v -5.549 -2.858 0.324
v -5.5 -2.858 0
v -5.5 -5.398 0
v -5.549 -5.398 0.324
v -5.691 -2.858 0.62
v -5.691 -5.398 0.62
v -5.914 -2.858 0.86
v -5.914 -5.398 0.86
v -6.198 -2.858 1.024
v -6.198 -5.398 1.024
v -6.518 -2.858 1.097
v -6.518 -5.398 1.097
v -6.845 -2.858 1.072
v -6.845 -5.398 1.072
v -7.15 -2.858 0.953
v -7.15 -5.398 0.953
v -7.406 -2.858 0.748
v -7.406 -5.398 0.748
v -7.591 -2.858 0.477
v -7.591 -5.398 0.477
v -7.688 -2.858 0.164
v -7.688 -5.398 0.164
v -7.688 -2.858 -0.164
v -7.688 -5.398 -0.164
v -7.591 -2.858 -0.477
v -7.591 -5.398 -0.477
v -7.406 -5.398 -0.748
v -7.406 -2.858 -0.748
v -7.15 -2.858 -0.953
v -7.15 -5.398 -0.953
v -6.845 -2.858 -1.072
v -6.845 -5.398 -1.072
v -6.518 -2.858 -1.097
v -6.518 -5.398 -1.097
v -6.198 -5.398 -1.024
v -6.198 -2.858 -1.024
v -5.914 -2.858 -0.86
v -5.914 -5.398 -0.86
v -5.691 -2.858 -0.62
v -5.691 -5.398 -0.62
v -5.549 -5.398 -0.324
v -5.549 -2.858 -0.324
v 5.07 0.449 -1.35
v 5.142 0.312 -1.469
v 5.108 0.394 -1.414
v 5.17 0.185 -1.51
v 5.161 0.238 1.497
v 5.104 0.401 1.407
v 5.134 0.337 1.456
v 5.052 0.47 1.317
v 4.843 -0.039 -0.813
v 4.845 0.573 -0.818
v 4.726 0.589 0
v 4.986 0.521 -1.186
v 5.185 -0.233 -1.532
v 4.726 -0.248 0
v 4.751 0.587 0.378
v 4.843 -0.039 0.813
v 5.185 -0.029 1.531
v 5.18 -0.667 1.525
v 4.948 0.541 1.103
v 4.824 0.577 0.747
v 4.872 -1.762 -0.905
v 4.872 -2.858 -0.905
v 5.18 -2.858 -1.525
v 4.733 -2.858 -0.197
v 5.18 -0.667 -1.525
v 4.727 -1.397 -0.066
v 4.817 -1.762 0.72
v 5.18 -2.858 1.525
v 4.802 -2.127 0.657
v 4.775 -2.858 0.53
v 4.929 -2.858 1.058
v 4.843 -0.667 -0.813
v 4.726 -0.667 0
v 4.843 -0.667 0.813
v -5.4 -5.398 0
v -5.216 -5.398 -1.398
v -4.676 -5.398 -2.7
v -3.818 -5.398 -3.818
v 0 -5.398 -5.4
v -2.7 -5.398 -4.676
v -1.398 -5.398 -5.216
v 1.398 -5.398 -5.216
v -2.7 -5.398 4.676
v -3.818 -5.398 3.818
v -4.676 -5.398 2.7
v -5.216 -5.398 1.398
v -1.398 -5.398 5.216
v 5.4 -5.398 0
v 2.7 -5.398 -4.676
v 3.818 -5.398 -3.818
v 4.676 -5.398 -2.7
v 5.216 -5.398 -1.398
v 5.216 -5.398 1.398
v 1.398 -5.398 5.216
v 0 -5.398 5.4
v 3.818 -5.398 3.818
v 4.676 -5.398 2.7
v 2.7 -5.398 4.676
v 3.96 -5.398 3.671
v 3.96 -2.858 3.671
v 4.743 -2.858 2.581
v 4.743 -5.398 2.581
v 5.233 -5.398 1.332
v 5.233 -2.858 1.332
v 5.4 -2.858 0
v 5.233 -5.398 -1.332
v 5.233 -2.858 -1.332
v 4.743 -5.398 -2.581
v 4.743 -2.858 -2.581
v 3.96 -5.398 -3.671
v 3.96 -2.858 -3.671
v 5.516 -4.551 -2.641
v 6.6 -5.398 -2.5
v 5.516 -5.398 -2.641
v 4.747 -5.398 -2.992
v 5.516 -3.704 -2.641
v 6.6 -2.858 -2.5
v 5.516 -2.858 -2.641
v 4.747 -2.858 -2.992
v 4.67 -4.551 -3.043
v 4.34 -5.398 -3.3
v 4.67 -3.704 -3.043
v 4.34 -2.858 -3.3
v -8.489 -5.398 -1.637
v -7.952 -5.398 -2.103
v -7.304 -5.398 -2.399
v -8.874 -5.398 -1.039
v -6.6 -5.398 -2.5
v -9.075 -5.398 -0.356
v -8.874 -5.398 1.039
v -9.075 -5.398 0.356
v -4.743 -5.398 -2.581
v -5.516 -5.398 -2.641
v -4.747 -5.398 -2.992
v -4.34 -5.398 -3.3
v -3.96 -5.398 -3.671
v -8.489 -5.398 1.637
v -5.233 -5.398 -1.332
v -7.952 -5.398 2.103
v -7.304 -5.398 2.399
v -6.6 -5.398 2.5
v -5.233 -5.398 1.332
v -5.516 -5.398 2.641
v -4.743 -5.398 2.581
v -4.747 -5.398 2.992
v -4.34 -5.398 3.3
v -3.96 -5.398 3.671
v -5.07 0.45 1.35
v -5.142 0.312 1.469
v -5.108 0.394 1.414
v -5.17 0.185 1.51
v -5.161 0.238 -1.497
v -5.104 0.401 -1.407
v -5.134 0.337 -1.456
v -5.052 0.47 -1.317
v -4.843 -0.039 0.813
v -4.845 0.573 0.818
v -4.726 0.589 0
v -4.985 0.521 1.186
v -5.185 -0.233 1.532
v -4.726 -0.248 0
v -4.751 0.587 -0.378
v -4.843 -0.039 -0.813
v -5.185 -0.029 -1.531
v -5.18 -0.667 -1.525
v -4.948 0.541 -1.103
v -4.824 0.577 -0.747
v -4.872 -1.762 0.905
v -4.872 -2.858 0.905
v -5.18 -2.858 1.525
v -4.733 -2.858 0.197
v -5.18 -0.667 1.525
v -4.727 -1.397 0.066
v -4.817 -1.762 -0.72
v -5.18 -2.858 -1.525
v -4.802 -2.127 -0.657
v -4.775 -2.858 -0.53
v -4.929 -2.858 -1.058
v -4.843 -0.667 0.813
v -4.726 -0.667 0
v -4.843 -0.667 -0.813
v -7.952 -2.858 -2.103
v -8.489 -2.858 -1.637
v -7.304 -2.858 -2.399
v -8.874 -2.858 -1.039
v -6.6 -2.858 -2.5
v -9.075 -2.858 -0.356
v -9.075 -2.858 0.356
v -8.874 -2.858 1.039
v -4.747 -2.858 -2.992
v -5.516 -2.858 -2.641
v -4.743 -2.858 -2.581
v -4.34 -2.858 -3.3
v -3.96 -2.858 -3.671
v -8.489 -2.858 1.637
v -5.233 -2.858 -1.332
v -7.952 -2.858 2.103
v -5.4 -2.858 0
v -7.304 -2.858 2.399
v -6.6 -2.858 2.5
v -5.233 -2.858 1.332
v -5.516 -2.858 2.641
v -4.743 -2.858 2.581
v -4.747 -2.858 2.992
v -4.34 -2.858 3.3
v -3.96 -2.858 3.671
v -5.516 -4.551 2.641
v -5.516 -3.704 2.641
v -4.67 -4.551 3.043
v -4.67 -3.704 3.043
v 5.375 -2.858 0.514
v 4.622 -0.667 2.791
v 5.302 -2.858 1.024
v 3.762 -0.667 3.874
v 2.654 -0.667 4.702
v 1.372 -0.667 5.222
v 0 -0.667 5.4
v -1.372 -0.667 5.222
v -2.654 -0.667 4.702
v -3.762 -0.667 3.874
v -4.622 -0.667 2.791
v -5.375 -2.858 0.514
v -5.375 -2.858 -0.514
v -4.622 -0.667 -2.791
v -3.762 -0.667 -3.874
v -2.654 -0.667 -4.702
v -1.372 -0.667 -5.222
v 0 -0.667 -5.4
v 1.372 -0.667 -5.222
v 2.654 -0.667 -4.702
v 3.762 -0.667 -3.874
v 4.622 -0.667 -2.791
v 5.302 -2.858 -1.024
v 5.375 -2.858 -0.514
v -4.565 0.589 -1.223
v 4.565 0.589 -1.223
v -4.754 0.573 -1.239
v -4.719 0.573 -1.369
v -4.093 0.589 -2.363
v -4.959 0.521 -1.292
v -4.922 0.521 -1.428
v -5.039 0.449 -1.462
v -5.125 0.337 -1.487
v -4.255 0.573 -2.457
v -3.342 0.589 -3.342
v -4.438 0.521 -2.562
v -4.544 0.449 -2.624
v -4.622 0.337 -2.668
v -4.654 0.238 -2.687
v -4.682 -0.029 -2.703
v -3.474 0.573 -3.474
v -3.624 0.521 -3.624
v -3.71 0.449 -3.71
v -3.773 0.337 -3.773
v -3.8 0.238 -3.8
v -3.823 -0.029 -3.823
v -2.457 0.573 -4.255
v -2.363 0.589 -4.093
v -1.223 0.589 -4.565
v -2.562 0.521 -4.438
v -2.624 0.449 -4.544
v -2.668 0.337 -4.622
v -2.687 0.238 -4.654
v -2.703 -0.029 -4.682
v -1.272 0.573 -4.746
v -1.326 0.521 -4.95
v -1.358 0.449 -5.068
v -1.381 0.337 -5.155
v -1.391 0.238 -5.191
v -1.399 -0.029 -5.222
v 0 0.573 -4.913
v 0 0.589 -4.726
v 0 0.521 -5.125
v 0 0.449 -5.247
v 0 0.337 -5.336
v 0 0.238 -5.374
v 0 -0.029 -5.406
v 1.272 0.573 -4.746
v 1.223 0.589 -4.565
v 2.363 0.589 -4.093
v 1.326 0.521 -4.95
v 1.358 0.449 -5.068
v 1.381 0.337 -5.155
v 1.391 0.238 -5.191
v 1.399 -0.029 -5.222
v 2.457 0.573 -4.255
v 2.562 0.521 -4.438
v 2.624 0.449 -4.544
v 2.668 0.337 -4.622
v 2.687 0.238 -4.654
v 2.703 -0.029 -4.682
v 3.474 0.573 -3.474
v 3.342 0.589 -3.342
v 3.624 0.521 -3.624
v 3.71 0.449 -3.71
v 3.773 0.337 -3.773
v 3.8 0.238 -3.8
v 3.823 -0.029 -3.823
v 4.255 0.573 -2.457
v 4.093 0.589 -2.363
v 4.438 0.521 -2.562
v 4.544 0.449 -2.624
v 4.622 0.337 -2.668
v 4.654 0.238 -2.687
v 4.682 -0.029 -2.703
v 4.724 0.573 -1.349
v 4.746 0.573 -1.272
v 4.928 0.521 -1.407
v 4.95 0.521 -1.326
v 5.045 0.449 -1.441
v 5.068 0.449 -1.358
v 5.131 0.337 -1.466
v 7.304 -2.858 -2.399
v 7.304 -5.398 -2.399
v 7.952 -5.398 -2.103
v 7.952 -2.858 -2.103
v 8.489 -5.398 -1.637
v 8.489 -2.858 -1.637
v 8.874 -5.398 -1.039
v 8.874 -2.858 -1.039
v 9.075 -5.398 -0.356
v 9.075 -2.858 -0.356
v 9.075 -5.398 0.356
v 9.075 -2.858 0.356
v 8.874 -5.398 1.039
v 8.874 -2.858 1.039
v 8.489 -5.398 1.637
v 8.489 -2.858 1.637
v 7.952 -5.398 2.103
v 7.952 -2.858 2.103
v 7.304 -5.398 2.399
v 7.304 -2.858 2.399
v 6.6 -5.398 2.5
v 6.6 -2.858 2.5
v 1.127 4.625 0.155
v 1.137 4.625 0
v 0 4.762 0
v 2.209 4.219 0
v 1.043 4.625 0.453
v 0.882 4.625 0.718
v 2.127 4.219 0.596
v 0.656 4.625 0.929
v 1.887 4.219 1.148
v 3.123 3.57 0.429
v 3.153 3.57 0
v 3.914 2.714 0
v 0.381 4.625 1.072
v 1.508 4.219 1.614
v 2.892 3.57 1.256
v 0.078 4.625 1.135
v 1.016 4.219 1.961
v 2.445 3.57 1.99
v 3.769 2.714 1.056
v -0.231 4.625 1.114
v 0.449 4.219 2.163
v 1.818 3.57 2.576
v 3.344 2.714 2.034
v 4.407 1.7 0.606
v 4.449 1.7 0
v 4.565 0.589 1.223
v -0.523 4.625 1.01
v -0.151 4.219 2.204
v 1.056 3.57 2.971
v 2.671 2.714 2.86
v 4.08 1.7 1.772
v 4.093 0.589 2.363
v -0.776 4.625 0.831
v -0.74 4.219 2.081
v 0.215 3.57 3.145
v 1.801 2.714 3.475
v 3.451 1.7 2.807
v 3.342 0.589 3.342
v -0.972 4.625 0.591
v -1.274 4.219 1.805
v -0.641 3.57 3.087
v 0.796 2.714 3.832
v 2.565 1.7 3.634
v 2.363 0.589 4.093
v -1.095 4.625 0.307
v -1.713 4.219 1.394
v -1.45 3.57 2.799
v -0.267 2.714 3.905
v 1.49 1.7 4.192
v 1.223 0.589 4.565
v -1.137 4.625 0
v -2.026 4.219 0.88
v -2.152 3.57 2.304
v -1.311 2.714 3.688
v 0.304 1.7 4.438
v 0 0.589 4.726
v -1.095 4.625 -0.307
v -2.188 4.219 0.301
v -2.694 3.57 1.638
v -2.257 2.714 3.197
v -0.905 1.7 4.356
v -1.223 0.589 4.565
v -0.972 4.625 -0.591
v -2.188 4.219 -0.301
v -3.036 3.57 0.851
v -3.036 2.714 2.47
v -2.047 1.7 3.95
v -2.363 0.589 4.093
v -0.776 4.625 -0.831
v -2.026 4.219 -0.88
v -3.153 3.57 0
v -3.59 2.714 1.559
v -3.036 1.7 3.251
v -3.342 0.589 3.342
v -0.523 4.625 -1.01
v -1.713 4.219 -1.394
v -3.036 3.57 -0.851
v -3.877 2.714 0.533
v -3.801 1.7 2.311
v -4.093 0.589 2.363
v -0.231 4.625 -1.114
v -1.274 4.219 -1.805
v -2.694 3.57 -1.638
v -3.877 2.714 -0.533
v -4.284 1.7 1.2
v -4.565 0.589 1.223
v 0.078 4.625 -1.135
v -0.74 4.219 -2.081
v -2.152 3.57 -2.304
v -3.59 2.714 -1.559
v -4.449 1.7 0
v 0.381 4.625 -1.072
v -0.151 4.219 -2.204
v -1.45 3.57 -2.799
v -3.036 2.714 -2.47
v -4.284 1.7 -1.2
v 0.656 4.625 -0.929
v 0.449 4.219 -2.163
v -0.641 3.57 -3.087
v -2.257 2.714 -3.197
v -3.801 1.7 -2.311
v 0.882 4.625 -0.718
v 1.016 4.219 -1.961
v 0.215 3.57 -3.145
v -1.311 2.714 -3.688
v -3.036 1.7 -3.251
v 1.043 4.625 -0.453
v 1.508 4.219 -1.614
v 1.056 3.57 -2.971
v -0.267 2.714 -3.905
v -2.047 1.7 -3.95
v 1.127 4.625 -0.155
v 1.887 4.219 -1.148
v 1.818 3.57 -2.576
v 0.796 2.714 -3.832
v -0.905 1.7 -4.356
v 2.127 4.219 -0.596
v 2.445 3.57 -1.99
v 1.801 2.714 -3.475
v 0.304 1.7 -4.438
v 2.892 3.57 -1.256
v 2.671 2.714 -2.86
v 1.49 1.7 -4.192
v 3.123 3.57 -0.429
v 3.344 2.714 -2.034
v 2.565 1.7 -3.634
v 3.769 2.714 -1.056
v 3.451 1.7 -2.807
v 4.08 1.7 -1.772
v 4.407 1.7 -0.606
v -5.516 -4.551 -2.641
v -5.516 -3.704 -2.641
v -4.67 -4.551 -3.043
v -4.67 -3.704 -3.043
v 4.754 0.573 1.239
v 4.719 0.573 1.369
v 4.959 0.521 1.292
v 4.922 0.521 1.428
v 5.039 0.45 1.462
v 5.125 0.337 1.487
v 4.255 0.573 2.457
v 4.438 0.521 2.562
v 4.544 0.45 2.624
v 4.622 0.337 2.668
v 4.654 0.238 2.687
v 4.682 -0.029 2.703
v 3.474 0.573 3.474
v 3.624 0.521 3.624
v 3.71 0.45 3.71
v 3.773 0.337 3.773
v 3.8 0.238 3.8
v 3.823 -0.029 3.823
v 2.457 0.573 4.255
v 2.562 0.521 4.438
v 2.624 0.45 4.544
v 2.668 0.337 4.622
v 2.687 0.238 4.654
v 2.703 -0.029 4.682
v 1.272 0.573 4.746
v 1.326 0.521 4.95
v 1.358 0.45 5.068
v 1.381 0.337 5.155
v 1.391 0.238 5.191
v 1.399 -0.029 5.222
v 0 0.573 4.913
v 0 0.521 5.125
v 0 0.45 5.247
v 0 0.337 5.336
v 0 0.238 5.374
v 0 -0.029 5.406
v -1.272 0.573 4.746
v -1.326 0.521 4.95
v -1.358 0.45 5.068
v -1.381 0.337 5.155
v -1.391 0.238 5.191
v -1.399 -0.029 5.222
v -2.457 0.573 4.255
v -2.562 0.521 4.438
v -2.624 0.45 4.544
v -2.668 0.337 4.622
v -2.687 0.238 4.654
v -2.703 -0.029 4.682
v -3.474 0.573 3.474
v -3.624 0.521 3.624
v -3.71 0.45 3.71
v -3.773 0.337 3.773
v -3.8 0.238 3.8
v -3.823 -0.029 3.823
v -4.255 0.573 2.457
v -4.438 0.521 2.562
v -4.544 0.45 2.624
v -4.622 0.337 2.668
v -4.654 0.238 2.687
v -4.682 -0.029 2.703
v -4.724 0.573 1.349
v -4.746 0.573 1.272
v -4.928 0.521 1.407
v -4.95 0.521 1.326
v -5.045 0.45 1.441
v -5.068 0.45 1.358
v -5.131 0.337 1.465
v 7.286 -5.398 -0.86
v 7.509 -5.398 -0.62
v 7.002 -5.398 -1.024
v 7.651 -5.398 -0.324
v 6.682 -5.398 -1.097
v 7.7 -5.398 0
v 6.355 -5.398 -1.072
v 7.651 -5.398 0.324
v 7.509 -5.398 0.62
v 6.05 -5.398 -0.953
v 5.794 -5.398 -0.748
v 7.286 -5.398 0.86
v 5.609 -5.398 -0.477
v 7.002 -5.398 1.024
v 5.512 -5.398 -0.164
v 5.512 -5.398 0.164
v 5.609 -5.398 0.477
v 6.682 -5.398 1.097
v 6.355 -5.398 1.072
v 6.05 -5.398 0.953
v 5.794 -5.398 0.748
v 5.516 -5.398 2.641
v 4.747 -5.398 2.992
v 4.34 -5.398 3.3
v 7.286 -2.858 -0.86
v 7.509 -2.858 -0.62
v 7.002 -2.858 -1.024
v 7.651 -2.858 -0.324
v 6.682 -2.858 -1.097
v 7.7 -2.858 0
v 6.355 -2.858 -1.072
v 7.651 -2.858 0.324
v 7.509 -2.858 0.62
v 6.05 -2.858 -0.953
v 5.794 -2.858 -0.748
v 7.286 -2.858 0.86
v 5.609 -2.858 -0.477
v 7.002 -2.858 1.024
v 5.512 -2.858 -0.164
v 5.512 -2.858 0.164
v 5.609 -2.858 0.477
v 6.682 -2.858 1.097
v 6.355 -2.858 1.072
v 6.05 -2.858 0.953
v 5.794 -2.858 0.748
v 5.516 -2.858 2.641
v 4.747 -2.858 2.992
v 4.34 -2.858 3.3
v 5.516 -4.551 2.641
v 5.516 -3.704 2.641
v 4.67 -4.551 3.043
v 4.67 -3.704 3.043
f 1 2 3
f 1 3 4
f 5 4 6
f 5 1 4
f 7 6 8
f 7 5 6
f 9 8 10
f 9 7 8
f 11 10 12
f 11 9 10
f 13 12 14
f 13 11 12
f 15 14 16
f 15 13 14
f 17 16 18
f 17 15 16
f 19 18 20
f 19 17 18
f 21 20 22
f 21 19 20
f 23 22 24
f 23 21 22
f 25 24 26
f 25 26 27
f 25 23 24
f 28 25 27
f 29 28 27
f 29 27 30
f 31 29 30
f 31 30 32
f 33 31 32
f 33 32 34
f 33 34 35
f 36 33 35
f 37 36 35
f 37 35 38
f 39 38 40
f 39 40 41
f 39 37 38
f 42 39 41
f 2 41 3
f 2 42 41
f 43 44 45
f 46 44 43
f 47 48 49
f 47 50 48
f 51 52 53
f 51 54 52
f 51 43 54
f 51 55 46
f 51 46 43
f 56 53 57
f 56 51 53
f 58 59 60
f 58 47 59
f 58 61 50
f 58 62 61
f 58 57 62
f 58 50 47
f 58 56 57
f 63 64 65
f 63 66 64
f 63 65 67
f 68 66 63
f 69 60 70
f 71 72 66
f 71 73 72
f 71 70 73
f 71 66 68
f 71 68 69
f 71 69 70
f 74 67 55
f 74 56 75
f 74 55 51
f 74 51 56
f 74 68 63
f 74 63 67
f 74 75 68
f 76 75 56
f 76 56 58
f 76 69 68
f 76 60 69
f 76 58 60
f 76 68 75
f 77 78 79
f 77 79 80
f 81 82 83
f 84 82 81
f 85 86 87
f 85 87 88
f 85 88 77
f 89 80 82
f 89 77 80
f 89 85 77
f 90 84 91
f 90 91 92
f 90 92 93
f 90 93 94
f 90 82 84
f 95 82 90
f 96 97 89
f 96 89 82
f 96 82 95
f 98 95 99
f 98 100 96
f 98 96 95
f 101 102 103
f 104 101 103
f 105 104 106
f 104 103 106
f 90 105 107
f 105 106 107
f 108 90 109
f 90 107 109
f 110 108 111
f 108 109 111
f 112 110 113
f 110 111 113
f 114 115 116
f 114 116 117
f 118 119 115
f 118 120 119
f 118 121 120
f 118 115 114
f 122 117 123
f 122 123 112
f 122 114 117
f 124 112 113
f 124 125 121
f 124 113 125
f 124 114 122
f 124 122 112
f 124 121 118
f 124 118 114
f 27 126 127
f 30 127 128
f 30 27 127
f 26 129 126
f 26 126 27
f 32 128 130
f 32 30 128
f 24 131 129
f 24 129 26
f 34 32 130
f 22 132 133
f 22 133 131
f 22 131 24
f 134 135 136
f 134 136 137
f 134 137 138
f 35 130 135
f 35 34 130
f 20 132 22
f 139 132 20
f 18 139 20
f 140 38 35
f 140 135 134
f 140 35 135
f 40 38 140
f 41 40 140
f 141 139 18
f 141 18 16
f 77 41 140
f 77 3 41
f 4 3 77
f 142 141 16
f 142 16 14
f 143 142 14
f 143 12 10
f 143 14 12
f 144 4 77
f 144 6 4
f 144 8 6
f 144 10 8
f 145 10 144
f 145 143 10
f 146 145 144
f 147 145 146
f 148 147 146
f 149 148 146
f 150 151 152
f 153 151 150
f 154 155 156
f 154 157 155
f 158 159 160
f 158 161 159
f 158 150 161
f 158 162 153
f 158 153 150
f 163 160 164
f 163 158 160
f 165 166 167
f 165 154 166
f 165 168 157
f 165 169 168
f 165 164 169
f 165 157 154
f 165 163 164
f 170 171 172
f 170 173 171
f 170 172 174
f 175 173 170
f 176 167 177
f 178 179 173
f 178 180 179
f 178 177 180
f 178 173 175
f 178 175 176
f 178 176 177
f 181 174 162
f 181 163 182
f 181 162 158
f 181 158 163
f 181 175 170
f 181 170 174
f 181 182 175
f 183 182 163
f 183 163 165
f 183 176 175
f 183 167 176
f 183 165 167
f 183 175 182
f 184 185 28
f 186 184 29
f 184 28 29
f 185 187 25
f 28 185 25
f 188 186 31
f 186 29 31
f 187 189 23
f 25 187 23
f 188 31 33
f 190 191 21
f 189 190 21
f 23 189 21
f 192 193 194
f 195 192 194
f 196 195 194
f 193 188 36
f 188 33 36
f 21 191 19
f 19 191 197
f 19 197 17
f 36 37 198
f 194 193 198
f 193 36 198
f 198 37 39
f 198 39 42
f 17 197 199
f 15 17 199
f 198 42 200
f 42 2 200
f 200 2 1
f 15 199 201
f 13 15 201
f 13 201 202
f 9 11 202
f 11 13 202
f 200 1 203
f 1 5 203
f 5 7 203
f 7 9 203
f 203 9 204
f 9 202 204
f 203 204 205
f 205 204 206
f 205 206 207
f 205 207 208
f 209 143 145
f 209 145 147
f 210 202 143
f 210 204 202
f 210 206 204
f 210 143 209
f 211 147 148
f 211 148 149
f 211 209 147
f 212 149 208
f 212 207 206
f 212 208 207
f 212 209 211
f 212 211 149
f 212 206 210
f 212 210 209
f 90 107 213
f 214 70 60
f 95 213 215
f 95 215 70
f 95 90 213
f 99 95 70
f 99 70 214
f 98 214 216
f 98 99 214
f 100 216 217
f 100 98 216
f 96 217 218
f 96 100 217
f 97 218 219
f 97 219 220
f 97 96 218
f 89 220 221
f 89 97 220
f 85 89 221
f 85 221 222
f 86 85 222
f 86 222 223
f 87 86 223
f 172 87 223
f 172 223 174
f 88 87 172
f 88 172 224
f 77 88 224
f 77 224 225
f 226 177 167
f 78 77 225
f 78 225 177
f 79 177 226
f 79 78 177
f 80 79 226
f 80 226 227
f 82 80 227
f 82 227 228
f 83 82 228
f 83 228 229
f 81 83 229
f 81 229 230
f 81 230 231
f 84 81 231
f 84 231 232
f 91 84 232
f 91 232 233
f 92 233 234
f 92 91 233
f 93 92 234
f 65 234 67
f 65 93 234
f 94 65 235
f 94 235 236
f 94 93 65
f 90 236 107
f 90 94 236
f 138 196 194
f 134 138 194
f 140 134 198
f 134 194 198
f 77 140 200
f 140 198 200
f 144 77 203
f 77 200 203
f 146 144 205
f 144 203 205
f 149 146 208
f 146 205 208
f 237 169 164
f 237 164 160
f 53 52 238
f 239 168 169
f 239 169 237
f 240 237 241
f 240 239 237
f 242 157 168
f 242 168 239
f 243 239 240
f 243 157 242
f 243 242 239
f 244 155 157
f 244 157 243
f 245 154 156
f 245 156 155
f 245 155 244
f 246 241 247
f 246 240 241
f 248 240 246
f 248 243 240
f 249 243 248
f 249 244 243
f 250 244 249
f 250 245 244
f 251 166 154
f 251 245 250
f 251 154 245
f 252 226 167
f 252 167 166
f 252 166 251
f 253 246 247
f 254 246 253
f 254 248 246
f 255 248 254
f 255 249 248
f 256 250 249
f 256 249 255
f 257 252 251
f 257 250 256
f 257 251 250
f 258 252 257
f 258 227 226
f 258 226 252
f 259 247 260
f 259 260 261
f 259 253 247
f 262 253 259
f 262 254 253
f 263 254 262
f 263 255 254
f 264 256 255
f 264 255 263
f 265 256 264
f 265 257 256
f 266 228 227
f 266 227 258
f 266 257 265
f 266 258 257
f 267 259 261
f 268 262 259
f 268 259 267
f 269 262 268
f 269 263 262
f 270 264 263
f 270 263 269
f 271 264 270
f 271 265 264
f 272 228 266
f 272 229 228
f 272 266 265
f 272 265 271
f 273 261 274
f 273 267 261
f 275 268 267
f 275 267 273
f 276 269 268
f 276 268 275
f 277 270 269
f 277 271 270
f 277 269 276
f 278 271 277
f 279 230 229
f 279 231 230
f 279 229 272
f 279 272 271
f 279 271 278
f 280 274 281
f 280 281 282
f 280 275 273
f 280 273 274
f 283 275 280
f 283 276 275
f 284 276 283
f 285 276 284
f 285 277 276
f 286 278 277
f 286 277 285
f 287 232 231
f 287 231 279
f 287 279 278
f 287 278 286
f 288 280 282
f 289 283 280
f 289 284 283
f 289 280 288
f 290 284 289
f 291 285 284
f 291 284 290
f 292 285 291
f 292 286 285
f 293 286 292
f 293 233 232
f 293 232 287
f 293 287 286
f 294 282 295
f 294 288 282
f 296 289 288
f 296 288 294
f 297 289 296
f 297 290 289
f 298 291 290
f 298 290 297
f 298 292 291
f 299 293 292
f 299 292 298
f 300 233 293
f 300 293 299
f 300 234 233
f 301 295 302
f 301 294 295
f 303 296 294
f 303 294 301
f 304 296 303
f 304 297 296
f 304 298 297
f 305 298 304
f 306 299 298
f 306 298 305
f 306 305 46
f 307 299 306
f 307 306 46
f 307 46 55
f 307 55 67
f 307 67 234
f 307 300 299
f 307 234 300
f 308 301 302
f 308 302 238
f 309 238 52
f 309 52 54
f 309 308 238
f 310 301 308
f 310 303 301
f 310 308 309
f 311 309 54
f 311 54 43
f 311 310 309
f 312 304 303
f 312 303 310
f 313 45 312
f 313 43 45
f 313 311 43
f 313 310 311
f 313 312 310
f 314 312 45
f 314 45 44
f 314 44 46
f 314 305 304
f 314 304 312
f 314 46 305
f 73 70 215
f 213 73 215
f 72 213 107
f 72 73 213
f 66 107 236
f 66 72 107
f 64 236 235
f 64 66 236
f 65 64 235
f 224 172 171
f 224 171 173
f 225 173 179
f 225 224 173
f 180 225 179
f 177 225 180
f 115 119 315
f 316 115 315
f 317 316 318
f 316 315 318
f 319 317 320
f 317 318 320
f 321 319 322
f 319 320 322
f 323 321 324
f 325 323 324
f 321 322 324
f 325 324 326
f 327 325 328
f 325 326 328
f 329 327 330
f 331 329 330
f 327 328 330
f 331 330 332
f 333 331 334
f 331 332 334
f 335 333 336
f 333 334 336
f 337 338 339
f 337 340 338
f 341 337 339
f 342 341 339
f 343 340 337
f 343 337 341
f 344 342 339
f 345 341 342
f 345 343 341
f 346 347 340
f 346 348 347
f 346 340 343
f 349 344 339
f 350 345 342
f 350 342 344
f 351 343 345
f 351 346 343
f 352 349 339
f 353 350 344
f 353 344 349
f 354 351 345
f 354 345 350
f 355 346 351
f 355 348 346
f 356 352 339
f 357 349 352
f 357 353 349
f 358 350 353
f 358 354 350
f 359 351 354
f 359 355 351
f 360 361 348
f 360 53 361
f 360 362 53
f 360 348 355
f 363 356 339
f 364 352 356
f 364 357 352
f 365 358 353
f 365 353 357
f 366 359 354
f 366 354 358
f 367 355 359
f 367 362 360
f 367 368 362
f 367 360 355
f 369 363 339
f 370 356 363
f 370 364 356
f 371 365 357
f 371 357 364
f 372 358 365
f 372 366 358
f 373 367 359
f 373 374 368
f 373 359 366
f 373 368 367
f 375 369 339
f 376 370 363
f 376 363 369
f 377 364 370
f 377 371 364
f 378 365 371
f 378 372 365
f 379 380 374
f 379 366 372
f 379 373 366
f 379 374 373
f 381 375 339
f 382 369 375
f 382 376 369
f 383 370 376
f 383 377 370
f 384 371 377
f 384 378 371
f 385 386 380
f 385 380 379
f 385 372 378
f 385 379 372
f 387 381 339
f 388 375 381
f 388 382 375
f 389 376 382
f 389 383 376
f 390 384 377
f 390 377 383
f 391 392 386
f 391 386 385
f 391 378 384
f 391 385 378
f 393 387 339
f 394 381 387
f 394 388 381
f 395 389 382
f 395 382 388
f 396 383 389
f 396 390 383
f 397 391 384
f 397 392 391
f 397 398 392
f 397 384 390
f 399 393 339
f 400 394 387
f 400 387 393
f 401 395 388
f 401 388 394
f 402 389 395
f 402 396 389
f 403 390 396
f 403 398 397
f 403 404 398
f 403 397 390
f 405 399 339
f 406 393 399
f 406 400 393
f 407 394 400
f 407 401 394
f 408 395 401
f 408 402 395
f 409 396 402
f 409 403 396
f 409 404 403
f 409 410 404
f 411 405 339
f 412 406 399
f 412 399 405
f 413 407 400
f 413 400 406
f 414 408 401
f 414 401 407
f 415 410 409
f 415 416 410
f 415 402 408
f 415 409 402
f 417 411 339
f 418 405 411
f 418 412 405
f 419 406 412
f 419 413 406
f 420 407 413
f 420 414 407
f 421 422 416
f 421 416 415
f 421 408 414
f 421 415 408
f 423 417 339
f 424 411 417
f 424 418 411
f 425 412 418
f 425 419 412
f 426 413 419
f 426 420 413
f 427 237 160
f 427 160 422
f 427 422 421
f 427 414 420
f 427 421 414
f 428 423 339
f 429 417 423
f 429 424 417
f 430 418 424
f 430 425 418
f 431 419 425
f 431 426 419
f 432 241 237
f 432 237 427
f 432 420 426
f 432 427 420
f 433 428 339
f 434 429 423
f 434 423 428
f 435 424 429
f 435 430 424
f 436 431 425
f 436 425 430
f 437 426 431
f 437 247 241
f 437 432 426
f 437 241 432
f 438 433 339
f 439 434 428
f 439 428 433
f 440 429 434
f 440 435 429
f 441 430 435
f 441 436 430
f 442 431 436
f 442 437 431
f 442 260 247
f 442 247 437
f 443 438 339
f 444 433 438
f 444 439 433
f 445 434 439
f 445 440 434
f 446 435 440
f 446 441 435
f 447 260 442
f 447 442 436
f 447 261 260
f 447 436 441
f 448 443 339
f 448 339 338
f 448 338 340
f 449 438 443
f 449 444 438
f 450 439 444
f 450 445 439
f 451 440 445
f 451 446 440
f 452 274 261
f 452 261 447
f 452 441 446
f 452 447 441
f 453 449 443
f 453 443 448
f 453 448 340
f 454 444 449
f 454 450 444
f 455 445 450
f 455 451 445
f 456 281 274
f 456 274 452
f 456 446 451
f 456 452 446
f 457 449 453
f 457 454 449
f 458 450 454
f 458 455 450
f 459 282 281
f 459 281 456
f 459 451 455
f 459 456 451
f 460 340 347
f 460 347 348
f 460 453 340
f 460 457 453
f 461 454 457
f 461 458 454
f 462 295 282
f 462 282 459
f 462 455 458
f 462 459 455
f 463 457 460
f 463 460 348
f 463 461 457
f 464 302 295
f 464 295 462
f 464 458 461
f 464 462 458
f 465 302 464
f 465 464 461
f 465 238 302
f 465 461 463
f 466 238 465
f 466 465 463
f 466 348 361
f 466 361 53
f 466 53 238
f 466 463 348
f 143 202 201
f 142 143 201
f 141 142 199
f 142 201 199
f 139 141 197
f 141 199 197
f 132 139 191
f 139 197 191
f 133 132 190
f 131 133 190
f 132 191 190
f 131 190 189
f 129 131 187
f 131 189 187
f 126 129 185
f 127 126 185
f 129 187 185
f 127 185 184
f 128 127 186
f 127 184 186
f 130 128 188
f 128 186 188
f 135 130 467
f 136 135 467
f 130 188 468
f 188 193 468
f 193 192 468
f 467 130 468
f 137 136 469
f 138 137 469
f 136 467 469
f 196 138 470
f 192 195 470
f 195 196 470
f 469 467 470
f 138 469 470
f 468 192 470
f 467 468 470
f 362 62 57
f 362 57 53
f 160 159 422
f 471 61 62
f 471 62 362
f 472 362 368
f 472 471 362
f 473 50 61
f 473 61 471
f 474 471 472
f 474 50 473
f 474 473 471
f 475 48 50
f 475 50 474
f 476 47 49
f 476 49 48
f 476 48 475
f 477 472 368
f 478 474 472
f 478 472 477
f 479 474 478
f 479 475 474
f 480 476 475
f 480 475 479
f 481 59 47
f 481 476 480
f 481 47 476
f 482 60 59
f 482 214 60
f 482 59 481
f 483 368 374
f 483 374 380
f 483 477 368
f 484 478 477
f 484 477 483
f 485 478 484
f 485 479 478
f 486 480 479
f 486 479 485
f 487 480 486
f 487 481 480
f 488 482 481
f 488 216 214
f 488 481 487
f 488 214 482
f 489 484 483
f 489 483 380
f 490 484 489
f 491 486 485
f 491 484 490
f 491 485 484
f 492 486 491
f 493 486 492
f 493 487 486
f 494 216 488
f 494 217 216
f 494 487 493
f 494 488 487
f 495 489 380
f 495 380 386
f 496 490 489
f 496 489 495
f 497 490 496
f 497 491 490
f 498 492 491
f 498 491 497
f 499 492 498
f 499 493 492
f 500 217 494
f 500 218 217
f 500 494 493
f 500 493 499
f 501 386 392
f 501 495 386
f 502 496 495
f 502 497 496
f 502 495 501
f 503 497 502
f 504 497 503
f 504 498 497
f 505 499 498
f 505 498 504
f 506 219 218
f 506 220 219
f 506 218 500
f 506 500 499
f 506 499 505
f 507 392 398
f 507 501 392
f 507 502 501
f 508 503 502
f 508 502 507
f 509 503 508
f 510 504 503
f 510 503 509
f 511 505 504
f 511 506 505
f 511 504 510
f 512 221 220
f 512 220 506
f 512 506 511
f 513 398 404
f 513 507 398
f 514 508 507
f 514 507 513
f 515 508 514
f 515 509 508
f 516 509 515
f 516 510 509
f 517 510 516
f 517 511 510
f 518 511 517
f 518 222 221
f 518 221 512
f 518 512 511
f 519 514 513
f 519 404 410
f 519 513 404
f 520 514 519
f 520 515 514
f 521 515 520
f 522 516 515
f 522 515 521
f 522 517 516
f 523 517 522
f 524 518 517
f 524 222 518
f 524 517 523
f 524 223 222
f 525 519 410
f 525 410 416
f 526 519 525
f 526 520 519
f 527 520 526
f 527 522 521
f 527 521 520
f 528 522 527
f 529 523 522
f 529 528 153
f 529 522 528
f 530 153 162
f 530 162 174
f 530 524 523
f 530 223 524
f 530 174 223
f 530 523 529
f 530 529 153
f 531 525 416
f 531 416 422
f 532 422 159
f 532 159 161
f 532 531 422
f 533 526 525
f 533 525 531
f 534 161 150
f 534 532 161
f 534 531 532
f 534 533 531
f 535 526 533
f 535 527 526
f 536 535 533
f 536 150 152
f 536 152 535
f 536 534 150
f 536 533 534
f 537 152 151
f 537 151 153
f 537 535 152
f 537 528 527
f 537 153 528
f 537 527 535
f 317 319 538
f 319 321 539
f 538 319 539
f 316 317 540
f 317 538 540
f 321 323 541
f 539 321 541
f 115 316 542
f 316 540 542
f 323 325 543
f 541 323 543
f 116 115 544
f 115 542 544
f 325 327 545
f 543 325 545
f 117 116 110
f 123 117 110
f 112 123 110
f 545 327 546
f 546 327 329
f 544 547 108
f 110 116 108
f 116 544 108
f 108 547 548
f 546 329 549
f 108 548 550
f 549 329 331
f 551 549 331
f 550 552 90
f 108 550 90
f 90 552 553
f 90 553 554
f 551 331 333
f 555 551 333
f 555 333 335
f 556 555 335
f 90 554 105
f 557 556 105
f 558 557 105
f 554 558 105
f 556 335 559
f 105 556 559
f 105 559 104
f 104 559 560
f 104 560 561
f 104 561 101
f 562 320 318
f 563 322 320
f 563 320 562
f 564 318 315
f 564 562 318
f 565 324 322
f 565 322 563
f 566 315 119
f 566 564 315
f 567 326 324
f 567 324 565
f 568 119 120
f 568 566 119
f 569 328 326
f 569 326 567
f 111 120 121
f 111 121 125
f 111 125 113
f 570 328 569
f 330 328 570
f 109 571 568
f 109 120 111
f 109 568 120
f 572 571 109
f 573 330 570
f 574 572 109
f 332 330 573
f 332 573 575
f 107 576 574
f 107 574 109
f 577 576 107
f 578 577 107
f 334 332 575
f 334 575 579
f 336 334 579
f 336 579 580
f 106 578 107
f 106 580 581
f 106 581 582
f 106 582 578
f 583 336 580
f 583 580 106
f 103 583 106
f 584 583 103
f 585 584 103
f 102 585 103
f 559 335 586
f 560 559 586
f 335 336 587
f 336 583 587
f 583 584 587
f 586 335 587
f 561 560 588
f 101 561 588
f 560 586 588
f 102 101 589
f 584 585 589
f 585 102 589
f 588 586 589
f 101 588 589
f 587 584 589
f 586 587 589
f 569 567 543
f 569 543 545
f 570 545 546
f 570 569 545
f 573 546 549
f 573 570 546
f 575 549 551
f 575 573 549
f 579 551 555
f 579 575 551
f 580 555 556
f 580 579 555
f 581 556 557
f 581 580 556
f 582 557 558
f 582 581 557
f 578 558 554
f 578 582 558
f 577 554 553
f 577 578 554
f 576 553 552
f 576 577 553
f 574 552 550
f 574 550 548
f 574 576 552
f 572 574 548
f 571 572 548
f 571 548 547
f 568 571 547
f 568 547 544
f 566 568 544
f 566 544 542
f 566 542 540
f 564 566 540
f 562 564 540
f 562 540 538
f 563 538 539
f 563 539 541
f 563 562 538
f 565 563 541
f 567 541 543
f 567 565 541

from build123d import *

# Parameters (mm, degrees)
BOSS_EXTRUDE1_START     = -2.54
BOSS_EXTRUDE1_OUTLINE_R = 1.1
BOSS_EXTRUDE1_DEPTH     = 2.54
SKETCH3_RX              = 2.33666154
SKETCH3_RY              = 1.874039112
CUT_EXTRUDE1_DEPTH      = 14.04273116


# Read off the part's stored shape, not the designer's step: Boss-Extrude1
with BuildPart() as part:
    # Sketch1 → Revolve3 (revolve)
    with BuildSketch(Plane.XY, mode=Mode.PRIVATE) as revolve3_sk:
        with BuildLine():
            Line((0, -5.3975), (0, 4.7625))
            ThreePointArc((0, 4.7625), (-3.152553538, 3.569707612), (-4.725960888, 0.58881231))
            add(Edge.make_bspline(
                [(-4.725960888, 0.58881231), (-5.528679385, 0.558813228), (-5.399616231, 0.190451496), (-5.399616231, -0.666596714)],
                knots=[0, 0, 0, 0, 1, 1, 1, 1], degree=3))
            Line((-5.399616231, -0.666596714), (-5.399616231, -5.3975))
            Line((-5.399616231, -5.3975), (0, -5.3975))
        make_face()
    revolve(revolve3_sk.sketch.rotate(Axis((0, 8.574910523, 0), (0, -1, 0)), 180), axis=Axis((0, 8.574910523, 0), (0, -1, 0)))

    # Sketch3 → Cut-Extrude1 (cut, through all)
    with BuildSketch(Plane(origin=(0, -2.8575, 0), x_dir=(1, 0, 0), z_dir=(0, 1, 0))):
        with Locations(Location((-6.6, 0), (0, 0, 90))):
            Ellipse(SKETCH3_RX, SKETCH3_RY)
        with Locations(Location((6.6, 0), (0, 0, 90))):
            Ellipse(SKETCH3_RX, SKETCH3_RY)
    extrude(amount=CUT_EXTRUDE1_DEPTH, mode=Mode.SUBTRACT)


with BuildPart() as body_2:
    # Boss-Extrude1 outline → Boss-Extrude1 (new body)
    # profile 1 of 2: a face of its own
    with BuildSketch(Plane.XZ.offset(5.3975).offset(BOSS_EXTRUDE1_START)):
        with BuildLine():
            add(Edge.make_bspline(
                [(6.6, -2.5), (5.362311666, -2.5), (4.636385799, -2.941104214), (3.959842535, -3.670899419)],
                knots=[0, 0, 0, 0, 1, 1, 1, 1], degree=3))
            ThreePointArc((6.6, -2.5), (9.1, 0), (6.6, 2.5))
            add(Edge.make_bspline(
                [(6.6, 2.5), (5.362311666, 2.5), (4.636385799, 2.941104214), (3.959842535, 3.670899419)],
                knots=[0, 0, 0, 0, 1, 1, 1, 1], degree=3))
            ThreePointArc((3.959842535, 3.670899419), (5.399616231, 0), (3.959842535, -3.670899419))
        make_face()
        with Locations((6.6, 0)):
            Circle(BOSS_EXTRUDE1_OUTLINE_R, mode=Mode.SUBTRACT)
    # profile 2 of 2: a face of its own
    with BuildSketch(Plane.XZ.offset(5.3975).offset(BOSS_EXTRUDE1_START)):
        with BuildLine():
            ThreePointArc((-6.6, 2.5), (-9.1, 0), (-6.6, -2.5))
            add(Edge.make_bspline(
                [(-6.6, -2.5), (-5.362311666, -2.5), (-4.636385799, -2.941104214), (-3.959842535, -3.670899419)],
                knots=[0, 0, 0, 0, 1, 1, 1, 1], degree=3))
            ThreePointArc((-3.959842535, -3.670899419), (-5.399616231, 0), (-3.959842535, 3.670899419))
            add(Edge.make_bspline(
                [(-6.6, 2.5), (-5.362311666, 2.5), (-4.636385799, 2.941104214), (-3.959842535, 3.670899419)],
                knots=[0, 0, 0, 0, 1, 1, 1, 1], degree=3))
        make_face()
        with Locations((-6.6, 0)):
            Circle(BOSS_EXTRUDE1_OUTLINE_R, mode=Mode.SUBTRACT)
    extrude(amount=BOSS_EXTRUDE1_DEPTH)


solid = Compound([part.part, body_2.part])
